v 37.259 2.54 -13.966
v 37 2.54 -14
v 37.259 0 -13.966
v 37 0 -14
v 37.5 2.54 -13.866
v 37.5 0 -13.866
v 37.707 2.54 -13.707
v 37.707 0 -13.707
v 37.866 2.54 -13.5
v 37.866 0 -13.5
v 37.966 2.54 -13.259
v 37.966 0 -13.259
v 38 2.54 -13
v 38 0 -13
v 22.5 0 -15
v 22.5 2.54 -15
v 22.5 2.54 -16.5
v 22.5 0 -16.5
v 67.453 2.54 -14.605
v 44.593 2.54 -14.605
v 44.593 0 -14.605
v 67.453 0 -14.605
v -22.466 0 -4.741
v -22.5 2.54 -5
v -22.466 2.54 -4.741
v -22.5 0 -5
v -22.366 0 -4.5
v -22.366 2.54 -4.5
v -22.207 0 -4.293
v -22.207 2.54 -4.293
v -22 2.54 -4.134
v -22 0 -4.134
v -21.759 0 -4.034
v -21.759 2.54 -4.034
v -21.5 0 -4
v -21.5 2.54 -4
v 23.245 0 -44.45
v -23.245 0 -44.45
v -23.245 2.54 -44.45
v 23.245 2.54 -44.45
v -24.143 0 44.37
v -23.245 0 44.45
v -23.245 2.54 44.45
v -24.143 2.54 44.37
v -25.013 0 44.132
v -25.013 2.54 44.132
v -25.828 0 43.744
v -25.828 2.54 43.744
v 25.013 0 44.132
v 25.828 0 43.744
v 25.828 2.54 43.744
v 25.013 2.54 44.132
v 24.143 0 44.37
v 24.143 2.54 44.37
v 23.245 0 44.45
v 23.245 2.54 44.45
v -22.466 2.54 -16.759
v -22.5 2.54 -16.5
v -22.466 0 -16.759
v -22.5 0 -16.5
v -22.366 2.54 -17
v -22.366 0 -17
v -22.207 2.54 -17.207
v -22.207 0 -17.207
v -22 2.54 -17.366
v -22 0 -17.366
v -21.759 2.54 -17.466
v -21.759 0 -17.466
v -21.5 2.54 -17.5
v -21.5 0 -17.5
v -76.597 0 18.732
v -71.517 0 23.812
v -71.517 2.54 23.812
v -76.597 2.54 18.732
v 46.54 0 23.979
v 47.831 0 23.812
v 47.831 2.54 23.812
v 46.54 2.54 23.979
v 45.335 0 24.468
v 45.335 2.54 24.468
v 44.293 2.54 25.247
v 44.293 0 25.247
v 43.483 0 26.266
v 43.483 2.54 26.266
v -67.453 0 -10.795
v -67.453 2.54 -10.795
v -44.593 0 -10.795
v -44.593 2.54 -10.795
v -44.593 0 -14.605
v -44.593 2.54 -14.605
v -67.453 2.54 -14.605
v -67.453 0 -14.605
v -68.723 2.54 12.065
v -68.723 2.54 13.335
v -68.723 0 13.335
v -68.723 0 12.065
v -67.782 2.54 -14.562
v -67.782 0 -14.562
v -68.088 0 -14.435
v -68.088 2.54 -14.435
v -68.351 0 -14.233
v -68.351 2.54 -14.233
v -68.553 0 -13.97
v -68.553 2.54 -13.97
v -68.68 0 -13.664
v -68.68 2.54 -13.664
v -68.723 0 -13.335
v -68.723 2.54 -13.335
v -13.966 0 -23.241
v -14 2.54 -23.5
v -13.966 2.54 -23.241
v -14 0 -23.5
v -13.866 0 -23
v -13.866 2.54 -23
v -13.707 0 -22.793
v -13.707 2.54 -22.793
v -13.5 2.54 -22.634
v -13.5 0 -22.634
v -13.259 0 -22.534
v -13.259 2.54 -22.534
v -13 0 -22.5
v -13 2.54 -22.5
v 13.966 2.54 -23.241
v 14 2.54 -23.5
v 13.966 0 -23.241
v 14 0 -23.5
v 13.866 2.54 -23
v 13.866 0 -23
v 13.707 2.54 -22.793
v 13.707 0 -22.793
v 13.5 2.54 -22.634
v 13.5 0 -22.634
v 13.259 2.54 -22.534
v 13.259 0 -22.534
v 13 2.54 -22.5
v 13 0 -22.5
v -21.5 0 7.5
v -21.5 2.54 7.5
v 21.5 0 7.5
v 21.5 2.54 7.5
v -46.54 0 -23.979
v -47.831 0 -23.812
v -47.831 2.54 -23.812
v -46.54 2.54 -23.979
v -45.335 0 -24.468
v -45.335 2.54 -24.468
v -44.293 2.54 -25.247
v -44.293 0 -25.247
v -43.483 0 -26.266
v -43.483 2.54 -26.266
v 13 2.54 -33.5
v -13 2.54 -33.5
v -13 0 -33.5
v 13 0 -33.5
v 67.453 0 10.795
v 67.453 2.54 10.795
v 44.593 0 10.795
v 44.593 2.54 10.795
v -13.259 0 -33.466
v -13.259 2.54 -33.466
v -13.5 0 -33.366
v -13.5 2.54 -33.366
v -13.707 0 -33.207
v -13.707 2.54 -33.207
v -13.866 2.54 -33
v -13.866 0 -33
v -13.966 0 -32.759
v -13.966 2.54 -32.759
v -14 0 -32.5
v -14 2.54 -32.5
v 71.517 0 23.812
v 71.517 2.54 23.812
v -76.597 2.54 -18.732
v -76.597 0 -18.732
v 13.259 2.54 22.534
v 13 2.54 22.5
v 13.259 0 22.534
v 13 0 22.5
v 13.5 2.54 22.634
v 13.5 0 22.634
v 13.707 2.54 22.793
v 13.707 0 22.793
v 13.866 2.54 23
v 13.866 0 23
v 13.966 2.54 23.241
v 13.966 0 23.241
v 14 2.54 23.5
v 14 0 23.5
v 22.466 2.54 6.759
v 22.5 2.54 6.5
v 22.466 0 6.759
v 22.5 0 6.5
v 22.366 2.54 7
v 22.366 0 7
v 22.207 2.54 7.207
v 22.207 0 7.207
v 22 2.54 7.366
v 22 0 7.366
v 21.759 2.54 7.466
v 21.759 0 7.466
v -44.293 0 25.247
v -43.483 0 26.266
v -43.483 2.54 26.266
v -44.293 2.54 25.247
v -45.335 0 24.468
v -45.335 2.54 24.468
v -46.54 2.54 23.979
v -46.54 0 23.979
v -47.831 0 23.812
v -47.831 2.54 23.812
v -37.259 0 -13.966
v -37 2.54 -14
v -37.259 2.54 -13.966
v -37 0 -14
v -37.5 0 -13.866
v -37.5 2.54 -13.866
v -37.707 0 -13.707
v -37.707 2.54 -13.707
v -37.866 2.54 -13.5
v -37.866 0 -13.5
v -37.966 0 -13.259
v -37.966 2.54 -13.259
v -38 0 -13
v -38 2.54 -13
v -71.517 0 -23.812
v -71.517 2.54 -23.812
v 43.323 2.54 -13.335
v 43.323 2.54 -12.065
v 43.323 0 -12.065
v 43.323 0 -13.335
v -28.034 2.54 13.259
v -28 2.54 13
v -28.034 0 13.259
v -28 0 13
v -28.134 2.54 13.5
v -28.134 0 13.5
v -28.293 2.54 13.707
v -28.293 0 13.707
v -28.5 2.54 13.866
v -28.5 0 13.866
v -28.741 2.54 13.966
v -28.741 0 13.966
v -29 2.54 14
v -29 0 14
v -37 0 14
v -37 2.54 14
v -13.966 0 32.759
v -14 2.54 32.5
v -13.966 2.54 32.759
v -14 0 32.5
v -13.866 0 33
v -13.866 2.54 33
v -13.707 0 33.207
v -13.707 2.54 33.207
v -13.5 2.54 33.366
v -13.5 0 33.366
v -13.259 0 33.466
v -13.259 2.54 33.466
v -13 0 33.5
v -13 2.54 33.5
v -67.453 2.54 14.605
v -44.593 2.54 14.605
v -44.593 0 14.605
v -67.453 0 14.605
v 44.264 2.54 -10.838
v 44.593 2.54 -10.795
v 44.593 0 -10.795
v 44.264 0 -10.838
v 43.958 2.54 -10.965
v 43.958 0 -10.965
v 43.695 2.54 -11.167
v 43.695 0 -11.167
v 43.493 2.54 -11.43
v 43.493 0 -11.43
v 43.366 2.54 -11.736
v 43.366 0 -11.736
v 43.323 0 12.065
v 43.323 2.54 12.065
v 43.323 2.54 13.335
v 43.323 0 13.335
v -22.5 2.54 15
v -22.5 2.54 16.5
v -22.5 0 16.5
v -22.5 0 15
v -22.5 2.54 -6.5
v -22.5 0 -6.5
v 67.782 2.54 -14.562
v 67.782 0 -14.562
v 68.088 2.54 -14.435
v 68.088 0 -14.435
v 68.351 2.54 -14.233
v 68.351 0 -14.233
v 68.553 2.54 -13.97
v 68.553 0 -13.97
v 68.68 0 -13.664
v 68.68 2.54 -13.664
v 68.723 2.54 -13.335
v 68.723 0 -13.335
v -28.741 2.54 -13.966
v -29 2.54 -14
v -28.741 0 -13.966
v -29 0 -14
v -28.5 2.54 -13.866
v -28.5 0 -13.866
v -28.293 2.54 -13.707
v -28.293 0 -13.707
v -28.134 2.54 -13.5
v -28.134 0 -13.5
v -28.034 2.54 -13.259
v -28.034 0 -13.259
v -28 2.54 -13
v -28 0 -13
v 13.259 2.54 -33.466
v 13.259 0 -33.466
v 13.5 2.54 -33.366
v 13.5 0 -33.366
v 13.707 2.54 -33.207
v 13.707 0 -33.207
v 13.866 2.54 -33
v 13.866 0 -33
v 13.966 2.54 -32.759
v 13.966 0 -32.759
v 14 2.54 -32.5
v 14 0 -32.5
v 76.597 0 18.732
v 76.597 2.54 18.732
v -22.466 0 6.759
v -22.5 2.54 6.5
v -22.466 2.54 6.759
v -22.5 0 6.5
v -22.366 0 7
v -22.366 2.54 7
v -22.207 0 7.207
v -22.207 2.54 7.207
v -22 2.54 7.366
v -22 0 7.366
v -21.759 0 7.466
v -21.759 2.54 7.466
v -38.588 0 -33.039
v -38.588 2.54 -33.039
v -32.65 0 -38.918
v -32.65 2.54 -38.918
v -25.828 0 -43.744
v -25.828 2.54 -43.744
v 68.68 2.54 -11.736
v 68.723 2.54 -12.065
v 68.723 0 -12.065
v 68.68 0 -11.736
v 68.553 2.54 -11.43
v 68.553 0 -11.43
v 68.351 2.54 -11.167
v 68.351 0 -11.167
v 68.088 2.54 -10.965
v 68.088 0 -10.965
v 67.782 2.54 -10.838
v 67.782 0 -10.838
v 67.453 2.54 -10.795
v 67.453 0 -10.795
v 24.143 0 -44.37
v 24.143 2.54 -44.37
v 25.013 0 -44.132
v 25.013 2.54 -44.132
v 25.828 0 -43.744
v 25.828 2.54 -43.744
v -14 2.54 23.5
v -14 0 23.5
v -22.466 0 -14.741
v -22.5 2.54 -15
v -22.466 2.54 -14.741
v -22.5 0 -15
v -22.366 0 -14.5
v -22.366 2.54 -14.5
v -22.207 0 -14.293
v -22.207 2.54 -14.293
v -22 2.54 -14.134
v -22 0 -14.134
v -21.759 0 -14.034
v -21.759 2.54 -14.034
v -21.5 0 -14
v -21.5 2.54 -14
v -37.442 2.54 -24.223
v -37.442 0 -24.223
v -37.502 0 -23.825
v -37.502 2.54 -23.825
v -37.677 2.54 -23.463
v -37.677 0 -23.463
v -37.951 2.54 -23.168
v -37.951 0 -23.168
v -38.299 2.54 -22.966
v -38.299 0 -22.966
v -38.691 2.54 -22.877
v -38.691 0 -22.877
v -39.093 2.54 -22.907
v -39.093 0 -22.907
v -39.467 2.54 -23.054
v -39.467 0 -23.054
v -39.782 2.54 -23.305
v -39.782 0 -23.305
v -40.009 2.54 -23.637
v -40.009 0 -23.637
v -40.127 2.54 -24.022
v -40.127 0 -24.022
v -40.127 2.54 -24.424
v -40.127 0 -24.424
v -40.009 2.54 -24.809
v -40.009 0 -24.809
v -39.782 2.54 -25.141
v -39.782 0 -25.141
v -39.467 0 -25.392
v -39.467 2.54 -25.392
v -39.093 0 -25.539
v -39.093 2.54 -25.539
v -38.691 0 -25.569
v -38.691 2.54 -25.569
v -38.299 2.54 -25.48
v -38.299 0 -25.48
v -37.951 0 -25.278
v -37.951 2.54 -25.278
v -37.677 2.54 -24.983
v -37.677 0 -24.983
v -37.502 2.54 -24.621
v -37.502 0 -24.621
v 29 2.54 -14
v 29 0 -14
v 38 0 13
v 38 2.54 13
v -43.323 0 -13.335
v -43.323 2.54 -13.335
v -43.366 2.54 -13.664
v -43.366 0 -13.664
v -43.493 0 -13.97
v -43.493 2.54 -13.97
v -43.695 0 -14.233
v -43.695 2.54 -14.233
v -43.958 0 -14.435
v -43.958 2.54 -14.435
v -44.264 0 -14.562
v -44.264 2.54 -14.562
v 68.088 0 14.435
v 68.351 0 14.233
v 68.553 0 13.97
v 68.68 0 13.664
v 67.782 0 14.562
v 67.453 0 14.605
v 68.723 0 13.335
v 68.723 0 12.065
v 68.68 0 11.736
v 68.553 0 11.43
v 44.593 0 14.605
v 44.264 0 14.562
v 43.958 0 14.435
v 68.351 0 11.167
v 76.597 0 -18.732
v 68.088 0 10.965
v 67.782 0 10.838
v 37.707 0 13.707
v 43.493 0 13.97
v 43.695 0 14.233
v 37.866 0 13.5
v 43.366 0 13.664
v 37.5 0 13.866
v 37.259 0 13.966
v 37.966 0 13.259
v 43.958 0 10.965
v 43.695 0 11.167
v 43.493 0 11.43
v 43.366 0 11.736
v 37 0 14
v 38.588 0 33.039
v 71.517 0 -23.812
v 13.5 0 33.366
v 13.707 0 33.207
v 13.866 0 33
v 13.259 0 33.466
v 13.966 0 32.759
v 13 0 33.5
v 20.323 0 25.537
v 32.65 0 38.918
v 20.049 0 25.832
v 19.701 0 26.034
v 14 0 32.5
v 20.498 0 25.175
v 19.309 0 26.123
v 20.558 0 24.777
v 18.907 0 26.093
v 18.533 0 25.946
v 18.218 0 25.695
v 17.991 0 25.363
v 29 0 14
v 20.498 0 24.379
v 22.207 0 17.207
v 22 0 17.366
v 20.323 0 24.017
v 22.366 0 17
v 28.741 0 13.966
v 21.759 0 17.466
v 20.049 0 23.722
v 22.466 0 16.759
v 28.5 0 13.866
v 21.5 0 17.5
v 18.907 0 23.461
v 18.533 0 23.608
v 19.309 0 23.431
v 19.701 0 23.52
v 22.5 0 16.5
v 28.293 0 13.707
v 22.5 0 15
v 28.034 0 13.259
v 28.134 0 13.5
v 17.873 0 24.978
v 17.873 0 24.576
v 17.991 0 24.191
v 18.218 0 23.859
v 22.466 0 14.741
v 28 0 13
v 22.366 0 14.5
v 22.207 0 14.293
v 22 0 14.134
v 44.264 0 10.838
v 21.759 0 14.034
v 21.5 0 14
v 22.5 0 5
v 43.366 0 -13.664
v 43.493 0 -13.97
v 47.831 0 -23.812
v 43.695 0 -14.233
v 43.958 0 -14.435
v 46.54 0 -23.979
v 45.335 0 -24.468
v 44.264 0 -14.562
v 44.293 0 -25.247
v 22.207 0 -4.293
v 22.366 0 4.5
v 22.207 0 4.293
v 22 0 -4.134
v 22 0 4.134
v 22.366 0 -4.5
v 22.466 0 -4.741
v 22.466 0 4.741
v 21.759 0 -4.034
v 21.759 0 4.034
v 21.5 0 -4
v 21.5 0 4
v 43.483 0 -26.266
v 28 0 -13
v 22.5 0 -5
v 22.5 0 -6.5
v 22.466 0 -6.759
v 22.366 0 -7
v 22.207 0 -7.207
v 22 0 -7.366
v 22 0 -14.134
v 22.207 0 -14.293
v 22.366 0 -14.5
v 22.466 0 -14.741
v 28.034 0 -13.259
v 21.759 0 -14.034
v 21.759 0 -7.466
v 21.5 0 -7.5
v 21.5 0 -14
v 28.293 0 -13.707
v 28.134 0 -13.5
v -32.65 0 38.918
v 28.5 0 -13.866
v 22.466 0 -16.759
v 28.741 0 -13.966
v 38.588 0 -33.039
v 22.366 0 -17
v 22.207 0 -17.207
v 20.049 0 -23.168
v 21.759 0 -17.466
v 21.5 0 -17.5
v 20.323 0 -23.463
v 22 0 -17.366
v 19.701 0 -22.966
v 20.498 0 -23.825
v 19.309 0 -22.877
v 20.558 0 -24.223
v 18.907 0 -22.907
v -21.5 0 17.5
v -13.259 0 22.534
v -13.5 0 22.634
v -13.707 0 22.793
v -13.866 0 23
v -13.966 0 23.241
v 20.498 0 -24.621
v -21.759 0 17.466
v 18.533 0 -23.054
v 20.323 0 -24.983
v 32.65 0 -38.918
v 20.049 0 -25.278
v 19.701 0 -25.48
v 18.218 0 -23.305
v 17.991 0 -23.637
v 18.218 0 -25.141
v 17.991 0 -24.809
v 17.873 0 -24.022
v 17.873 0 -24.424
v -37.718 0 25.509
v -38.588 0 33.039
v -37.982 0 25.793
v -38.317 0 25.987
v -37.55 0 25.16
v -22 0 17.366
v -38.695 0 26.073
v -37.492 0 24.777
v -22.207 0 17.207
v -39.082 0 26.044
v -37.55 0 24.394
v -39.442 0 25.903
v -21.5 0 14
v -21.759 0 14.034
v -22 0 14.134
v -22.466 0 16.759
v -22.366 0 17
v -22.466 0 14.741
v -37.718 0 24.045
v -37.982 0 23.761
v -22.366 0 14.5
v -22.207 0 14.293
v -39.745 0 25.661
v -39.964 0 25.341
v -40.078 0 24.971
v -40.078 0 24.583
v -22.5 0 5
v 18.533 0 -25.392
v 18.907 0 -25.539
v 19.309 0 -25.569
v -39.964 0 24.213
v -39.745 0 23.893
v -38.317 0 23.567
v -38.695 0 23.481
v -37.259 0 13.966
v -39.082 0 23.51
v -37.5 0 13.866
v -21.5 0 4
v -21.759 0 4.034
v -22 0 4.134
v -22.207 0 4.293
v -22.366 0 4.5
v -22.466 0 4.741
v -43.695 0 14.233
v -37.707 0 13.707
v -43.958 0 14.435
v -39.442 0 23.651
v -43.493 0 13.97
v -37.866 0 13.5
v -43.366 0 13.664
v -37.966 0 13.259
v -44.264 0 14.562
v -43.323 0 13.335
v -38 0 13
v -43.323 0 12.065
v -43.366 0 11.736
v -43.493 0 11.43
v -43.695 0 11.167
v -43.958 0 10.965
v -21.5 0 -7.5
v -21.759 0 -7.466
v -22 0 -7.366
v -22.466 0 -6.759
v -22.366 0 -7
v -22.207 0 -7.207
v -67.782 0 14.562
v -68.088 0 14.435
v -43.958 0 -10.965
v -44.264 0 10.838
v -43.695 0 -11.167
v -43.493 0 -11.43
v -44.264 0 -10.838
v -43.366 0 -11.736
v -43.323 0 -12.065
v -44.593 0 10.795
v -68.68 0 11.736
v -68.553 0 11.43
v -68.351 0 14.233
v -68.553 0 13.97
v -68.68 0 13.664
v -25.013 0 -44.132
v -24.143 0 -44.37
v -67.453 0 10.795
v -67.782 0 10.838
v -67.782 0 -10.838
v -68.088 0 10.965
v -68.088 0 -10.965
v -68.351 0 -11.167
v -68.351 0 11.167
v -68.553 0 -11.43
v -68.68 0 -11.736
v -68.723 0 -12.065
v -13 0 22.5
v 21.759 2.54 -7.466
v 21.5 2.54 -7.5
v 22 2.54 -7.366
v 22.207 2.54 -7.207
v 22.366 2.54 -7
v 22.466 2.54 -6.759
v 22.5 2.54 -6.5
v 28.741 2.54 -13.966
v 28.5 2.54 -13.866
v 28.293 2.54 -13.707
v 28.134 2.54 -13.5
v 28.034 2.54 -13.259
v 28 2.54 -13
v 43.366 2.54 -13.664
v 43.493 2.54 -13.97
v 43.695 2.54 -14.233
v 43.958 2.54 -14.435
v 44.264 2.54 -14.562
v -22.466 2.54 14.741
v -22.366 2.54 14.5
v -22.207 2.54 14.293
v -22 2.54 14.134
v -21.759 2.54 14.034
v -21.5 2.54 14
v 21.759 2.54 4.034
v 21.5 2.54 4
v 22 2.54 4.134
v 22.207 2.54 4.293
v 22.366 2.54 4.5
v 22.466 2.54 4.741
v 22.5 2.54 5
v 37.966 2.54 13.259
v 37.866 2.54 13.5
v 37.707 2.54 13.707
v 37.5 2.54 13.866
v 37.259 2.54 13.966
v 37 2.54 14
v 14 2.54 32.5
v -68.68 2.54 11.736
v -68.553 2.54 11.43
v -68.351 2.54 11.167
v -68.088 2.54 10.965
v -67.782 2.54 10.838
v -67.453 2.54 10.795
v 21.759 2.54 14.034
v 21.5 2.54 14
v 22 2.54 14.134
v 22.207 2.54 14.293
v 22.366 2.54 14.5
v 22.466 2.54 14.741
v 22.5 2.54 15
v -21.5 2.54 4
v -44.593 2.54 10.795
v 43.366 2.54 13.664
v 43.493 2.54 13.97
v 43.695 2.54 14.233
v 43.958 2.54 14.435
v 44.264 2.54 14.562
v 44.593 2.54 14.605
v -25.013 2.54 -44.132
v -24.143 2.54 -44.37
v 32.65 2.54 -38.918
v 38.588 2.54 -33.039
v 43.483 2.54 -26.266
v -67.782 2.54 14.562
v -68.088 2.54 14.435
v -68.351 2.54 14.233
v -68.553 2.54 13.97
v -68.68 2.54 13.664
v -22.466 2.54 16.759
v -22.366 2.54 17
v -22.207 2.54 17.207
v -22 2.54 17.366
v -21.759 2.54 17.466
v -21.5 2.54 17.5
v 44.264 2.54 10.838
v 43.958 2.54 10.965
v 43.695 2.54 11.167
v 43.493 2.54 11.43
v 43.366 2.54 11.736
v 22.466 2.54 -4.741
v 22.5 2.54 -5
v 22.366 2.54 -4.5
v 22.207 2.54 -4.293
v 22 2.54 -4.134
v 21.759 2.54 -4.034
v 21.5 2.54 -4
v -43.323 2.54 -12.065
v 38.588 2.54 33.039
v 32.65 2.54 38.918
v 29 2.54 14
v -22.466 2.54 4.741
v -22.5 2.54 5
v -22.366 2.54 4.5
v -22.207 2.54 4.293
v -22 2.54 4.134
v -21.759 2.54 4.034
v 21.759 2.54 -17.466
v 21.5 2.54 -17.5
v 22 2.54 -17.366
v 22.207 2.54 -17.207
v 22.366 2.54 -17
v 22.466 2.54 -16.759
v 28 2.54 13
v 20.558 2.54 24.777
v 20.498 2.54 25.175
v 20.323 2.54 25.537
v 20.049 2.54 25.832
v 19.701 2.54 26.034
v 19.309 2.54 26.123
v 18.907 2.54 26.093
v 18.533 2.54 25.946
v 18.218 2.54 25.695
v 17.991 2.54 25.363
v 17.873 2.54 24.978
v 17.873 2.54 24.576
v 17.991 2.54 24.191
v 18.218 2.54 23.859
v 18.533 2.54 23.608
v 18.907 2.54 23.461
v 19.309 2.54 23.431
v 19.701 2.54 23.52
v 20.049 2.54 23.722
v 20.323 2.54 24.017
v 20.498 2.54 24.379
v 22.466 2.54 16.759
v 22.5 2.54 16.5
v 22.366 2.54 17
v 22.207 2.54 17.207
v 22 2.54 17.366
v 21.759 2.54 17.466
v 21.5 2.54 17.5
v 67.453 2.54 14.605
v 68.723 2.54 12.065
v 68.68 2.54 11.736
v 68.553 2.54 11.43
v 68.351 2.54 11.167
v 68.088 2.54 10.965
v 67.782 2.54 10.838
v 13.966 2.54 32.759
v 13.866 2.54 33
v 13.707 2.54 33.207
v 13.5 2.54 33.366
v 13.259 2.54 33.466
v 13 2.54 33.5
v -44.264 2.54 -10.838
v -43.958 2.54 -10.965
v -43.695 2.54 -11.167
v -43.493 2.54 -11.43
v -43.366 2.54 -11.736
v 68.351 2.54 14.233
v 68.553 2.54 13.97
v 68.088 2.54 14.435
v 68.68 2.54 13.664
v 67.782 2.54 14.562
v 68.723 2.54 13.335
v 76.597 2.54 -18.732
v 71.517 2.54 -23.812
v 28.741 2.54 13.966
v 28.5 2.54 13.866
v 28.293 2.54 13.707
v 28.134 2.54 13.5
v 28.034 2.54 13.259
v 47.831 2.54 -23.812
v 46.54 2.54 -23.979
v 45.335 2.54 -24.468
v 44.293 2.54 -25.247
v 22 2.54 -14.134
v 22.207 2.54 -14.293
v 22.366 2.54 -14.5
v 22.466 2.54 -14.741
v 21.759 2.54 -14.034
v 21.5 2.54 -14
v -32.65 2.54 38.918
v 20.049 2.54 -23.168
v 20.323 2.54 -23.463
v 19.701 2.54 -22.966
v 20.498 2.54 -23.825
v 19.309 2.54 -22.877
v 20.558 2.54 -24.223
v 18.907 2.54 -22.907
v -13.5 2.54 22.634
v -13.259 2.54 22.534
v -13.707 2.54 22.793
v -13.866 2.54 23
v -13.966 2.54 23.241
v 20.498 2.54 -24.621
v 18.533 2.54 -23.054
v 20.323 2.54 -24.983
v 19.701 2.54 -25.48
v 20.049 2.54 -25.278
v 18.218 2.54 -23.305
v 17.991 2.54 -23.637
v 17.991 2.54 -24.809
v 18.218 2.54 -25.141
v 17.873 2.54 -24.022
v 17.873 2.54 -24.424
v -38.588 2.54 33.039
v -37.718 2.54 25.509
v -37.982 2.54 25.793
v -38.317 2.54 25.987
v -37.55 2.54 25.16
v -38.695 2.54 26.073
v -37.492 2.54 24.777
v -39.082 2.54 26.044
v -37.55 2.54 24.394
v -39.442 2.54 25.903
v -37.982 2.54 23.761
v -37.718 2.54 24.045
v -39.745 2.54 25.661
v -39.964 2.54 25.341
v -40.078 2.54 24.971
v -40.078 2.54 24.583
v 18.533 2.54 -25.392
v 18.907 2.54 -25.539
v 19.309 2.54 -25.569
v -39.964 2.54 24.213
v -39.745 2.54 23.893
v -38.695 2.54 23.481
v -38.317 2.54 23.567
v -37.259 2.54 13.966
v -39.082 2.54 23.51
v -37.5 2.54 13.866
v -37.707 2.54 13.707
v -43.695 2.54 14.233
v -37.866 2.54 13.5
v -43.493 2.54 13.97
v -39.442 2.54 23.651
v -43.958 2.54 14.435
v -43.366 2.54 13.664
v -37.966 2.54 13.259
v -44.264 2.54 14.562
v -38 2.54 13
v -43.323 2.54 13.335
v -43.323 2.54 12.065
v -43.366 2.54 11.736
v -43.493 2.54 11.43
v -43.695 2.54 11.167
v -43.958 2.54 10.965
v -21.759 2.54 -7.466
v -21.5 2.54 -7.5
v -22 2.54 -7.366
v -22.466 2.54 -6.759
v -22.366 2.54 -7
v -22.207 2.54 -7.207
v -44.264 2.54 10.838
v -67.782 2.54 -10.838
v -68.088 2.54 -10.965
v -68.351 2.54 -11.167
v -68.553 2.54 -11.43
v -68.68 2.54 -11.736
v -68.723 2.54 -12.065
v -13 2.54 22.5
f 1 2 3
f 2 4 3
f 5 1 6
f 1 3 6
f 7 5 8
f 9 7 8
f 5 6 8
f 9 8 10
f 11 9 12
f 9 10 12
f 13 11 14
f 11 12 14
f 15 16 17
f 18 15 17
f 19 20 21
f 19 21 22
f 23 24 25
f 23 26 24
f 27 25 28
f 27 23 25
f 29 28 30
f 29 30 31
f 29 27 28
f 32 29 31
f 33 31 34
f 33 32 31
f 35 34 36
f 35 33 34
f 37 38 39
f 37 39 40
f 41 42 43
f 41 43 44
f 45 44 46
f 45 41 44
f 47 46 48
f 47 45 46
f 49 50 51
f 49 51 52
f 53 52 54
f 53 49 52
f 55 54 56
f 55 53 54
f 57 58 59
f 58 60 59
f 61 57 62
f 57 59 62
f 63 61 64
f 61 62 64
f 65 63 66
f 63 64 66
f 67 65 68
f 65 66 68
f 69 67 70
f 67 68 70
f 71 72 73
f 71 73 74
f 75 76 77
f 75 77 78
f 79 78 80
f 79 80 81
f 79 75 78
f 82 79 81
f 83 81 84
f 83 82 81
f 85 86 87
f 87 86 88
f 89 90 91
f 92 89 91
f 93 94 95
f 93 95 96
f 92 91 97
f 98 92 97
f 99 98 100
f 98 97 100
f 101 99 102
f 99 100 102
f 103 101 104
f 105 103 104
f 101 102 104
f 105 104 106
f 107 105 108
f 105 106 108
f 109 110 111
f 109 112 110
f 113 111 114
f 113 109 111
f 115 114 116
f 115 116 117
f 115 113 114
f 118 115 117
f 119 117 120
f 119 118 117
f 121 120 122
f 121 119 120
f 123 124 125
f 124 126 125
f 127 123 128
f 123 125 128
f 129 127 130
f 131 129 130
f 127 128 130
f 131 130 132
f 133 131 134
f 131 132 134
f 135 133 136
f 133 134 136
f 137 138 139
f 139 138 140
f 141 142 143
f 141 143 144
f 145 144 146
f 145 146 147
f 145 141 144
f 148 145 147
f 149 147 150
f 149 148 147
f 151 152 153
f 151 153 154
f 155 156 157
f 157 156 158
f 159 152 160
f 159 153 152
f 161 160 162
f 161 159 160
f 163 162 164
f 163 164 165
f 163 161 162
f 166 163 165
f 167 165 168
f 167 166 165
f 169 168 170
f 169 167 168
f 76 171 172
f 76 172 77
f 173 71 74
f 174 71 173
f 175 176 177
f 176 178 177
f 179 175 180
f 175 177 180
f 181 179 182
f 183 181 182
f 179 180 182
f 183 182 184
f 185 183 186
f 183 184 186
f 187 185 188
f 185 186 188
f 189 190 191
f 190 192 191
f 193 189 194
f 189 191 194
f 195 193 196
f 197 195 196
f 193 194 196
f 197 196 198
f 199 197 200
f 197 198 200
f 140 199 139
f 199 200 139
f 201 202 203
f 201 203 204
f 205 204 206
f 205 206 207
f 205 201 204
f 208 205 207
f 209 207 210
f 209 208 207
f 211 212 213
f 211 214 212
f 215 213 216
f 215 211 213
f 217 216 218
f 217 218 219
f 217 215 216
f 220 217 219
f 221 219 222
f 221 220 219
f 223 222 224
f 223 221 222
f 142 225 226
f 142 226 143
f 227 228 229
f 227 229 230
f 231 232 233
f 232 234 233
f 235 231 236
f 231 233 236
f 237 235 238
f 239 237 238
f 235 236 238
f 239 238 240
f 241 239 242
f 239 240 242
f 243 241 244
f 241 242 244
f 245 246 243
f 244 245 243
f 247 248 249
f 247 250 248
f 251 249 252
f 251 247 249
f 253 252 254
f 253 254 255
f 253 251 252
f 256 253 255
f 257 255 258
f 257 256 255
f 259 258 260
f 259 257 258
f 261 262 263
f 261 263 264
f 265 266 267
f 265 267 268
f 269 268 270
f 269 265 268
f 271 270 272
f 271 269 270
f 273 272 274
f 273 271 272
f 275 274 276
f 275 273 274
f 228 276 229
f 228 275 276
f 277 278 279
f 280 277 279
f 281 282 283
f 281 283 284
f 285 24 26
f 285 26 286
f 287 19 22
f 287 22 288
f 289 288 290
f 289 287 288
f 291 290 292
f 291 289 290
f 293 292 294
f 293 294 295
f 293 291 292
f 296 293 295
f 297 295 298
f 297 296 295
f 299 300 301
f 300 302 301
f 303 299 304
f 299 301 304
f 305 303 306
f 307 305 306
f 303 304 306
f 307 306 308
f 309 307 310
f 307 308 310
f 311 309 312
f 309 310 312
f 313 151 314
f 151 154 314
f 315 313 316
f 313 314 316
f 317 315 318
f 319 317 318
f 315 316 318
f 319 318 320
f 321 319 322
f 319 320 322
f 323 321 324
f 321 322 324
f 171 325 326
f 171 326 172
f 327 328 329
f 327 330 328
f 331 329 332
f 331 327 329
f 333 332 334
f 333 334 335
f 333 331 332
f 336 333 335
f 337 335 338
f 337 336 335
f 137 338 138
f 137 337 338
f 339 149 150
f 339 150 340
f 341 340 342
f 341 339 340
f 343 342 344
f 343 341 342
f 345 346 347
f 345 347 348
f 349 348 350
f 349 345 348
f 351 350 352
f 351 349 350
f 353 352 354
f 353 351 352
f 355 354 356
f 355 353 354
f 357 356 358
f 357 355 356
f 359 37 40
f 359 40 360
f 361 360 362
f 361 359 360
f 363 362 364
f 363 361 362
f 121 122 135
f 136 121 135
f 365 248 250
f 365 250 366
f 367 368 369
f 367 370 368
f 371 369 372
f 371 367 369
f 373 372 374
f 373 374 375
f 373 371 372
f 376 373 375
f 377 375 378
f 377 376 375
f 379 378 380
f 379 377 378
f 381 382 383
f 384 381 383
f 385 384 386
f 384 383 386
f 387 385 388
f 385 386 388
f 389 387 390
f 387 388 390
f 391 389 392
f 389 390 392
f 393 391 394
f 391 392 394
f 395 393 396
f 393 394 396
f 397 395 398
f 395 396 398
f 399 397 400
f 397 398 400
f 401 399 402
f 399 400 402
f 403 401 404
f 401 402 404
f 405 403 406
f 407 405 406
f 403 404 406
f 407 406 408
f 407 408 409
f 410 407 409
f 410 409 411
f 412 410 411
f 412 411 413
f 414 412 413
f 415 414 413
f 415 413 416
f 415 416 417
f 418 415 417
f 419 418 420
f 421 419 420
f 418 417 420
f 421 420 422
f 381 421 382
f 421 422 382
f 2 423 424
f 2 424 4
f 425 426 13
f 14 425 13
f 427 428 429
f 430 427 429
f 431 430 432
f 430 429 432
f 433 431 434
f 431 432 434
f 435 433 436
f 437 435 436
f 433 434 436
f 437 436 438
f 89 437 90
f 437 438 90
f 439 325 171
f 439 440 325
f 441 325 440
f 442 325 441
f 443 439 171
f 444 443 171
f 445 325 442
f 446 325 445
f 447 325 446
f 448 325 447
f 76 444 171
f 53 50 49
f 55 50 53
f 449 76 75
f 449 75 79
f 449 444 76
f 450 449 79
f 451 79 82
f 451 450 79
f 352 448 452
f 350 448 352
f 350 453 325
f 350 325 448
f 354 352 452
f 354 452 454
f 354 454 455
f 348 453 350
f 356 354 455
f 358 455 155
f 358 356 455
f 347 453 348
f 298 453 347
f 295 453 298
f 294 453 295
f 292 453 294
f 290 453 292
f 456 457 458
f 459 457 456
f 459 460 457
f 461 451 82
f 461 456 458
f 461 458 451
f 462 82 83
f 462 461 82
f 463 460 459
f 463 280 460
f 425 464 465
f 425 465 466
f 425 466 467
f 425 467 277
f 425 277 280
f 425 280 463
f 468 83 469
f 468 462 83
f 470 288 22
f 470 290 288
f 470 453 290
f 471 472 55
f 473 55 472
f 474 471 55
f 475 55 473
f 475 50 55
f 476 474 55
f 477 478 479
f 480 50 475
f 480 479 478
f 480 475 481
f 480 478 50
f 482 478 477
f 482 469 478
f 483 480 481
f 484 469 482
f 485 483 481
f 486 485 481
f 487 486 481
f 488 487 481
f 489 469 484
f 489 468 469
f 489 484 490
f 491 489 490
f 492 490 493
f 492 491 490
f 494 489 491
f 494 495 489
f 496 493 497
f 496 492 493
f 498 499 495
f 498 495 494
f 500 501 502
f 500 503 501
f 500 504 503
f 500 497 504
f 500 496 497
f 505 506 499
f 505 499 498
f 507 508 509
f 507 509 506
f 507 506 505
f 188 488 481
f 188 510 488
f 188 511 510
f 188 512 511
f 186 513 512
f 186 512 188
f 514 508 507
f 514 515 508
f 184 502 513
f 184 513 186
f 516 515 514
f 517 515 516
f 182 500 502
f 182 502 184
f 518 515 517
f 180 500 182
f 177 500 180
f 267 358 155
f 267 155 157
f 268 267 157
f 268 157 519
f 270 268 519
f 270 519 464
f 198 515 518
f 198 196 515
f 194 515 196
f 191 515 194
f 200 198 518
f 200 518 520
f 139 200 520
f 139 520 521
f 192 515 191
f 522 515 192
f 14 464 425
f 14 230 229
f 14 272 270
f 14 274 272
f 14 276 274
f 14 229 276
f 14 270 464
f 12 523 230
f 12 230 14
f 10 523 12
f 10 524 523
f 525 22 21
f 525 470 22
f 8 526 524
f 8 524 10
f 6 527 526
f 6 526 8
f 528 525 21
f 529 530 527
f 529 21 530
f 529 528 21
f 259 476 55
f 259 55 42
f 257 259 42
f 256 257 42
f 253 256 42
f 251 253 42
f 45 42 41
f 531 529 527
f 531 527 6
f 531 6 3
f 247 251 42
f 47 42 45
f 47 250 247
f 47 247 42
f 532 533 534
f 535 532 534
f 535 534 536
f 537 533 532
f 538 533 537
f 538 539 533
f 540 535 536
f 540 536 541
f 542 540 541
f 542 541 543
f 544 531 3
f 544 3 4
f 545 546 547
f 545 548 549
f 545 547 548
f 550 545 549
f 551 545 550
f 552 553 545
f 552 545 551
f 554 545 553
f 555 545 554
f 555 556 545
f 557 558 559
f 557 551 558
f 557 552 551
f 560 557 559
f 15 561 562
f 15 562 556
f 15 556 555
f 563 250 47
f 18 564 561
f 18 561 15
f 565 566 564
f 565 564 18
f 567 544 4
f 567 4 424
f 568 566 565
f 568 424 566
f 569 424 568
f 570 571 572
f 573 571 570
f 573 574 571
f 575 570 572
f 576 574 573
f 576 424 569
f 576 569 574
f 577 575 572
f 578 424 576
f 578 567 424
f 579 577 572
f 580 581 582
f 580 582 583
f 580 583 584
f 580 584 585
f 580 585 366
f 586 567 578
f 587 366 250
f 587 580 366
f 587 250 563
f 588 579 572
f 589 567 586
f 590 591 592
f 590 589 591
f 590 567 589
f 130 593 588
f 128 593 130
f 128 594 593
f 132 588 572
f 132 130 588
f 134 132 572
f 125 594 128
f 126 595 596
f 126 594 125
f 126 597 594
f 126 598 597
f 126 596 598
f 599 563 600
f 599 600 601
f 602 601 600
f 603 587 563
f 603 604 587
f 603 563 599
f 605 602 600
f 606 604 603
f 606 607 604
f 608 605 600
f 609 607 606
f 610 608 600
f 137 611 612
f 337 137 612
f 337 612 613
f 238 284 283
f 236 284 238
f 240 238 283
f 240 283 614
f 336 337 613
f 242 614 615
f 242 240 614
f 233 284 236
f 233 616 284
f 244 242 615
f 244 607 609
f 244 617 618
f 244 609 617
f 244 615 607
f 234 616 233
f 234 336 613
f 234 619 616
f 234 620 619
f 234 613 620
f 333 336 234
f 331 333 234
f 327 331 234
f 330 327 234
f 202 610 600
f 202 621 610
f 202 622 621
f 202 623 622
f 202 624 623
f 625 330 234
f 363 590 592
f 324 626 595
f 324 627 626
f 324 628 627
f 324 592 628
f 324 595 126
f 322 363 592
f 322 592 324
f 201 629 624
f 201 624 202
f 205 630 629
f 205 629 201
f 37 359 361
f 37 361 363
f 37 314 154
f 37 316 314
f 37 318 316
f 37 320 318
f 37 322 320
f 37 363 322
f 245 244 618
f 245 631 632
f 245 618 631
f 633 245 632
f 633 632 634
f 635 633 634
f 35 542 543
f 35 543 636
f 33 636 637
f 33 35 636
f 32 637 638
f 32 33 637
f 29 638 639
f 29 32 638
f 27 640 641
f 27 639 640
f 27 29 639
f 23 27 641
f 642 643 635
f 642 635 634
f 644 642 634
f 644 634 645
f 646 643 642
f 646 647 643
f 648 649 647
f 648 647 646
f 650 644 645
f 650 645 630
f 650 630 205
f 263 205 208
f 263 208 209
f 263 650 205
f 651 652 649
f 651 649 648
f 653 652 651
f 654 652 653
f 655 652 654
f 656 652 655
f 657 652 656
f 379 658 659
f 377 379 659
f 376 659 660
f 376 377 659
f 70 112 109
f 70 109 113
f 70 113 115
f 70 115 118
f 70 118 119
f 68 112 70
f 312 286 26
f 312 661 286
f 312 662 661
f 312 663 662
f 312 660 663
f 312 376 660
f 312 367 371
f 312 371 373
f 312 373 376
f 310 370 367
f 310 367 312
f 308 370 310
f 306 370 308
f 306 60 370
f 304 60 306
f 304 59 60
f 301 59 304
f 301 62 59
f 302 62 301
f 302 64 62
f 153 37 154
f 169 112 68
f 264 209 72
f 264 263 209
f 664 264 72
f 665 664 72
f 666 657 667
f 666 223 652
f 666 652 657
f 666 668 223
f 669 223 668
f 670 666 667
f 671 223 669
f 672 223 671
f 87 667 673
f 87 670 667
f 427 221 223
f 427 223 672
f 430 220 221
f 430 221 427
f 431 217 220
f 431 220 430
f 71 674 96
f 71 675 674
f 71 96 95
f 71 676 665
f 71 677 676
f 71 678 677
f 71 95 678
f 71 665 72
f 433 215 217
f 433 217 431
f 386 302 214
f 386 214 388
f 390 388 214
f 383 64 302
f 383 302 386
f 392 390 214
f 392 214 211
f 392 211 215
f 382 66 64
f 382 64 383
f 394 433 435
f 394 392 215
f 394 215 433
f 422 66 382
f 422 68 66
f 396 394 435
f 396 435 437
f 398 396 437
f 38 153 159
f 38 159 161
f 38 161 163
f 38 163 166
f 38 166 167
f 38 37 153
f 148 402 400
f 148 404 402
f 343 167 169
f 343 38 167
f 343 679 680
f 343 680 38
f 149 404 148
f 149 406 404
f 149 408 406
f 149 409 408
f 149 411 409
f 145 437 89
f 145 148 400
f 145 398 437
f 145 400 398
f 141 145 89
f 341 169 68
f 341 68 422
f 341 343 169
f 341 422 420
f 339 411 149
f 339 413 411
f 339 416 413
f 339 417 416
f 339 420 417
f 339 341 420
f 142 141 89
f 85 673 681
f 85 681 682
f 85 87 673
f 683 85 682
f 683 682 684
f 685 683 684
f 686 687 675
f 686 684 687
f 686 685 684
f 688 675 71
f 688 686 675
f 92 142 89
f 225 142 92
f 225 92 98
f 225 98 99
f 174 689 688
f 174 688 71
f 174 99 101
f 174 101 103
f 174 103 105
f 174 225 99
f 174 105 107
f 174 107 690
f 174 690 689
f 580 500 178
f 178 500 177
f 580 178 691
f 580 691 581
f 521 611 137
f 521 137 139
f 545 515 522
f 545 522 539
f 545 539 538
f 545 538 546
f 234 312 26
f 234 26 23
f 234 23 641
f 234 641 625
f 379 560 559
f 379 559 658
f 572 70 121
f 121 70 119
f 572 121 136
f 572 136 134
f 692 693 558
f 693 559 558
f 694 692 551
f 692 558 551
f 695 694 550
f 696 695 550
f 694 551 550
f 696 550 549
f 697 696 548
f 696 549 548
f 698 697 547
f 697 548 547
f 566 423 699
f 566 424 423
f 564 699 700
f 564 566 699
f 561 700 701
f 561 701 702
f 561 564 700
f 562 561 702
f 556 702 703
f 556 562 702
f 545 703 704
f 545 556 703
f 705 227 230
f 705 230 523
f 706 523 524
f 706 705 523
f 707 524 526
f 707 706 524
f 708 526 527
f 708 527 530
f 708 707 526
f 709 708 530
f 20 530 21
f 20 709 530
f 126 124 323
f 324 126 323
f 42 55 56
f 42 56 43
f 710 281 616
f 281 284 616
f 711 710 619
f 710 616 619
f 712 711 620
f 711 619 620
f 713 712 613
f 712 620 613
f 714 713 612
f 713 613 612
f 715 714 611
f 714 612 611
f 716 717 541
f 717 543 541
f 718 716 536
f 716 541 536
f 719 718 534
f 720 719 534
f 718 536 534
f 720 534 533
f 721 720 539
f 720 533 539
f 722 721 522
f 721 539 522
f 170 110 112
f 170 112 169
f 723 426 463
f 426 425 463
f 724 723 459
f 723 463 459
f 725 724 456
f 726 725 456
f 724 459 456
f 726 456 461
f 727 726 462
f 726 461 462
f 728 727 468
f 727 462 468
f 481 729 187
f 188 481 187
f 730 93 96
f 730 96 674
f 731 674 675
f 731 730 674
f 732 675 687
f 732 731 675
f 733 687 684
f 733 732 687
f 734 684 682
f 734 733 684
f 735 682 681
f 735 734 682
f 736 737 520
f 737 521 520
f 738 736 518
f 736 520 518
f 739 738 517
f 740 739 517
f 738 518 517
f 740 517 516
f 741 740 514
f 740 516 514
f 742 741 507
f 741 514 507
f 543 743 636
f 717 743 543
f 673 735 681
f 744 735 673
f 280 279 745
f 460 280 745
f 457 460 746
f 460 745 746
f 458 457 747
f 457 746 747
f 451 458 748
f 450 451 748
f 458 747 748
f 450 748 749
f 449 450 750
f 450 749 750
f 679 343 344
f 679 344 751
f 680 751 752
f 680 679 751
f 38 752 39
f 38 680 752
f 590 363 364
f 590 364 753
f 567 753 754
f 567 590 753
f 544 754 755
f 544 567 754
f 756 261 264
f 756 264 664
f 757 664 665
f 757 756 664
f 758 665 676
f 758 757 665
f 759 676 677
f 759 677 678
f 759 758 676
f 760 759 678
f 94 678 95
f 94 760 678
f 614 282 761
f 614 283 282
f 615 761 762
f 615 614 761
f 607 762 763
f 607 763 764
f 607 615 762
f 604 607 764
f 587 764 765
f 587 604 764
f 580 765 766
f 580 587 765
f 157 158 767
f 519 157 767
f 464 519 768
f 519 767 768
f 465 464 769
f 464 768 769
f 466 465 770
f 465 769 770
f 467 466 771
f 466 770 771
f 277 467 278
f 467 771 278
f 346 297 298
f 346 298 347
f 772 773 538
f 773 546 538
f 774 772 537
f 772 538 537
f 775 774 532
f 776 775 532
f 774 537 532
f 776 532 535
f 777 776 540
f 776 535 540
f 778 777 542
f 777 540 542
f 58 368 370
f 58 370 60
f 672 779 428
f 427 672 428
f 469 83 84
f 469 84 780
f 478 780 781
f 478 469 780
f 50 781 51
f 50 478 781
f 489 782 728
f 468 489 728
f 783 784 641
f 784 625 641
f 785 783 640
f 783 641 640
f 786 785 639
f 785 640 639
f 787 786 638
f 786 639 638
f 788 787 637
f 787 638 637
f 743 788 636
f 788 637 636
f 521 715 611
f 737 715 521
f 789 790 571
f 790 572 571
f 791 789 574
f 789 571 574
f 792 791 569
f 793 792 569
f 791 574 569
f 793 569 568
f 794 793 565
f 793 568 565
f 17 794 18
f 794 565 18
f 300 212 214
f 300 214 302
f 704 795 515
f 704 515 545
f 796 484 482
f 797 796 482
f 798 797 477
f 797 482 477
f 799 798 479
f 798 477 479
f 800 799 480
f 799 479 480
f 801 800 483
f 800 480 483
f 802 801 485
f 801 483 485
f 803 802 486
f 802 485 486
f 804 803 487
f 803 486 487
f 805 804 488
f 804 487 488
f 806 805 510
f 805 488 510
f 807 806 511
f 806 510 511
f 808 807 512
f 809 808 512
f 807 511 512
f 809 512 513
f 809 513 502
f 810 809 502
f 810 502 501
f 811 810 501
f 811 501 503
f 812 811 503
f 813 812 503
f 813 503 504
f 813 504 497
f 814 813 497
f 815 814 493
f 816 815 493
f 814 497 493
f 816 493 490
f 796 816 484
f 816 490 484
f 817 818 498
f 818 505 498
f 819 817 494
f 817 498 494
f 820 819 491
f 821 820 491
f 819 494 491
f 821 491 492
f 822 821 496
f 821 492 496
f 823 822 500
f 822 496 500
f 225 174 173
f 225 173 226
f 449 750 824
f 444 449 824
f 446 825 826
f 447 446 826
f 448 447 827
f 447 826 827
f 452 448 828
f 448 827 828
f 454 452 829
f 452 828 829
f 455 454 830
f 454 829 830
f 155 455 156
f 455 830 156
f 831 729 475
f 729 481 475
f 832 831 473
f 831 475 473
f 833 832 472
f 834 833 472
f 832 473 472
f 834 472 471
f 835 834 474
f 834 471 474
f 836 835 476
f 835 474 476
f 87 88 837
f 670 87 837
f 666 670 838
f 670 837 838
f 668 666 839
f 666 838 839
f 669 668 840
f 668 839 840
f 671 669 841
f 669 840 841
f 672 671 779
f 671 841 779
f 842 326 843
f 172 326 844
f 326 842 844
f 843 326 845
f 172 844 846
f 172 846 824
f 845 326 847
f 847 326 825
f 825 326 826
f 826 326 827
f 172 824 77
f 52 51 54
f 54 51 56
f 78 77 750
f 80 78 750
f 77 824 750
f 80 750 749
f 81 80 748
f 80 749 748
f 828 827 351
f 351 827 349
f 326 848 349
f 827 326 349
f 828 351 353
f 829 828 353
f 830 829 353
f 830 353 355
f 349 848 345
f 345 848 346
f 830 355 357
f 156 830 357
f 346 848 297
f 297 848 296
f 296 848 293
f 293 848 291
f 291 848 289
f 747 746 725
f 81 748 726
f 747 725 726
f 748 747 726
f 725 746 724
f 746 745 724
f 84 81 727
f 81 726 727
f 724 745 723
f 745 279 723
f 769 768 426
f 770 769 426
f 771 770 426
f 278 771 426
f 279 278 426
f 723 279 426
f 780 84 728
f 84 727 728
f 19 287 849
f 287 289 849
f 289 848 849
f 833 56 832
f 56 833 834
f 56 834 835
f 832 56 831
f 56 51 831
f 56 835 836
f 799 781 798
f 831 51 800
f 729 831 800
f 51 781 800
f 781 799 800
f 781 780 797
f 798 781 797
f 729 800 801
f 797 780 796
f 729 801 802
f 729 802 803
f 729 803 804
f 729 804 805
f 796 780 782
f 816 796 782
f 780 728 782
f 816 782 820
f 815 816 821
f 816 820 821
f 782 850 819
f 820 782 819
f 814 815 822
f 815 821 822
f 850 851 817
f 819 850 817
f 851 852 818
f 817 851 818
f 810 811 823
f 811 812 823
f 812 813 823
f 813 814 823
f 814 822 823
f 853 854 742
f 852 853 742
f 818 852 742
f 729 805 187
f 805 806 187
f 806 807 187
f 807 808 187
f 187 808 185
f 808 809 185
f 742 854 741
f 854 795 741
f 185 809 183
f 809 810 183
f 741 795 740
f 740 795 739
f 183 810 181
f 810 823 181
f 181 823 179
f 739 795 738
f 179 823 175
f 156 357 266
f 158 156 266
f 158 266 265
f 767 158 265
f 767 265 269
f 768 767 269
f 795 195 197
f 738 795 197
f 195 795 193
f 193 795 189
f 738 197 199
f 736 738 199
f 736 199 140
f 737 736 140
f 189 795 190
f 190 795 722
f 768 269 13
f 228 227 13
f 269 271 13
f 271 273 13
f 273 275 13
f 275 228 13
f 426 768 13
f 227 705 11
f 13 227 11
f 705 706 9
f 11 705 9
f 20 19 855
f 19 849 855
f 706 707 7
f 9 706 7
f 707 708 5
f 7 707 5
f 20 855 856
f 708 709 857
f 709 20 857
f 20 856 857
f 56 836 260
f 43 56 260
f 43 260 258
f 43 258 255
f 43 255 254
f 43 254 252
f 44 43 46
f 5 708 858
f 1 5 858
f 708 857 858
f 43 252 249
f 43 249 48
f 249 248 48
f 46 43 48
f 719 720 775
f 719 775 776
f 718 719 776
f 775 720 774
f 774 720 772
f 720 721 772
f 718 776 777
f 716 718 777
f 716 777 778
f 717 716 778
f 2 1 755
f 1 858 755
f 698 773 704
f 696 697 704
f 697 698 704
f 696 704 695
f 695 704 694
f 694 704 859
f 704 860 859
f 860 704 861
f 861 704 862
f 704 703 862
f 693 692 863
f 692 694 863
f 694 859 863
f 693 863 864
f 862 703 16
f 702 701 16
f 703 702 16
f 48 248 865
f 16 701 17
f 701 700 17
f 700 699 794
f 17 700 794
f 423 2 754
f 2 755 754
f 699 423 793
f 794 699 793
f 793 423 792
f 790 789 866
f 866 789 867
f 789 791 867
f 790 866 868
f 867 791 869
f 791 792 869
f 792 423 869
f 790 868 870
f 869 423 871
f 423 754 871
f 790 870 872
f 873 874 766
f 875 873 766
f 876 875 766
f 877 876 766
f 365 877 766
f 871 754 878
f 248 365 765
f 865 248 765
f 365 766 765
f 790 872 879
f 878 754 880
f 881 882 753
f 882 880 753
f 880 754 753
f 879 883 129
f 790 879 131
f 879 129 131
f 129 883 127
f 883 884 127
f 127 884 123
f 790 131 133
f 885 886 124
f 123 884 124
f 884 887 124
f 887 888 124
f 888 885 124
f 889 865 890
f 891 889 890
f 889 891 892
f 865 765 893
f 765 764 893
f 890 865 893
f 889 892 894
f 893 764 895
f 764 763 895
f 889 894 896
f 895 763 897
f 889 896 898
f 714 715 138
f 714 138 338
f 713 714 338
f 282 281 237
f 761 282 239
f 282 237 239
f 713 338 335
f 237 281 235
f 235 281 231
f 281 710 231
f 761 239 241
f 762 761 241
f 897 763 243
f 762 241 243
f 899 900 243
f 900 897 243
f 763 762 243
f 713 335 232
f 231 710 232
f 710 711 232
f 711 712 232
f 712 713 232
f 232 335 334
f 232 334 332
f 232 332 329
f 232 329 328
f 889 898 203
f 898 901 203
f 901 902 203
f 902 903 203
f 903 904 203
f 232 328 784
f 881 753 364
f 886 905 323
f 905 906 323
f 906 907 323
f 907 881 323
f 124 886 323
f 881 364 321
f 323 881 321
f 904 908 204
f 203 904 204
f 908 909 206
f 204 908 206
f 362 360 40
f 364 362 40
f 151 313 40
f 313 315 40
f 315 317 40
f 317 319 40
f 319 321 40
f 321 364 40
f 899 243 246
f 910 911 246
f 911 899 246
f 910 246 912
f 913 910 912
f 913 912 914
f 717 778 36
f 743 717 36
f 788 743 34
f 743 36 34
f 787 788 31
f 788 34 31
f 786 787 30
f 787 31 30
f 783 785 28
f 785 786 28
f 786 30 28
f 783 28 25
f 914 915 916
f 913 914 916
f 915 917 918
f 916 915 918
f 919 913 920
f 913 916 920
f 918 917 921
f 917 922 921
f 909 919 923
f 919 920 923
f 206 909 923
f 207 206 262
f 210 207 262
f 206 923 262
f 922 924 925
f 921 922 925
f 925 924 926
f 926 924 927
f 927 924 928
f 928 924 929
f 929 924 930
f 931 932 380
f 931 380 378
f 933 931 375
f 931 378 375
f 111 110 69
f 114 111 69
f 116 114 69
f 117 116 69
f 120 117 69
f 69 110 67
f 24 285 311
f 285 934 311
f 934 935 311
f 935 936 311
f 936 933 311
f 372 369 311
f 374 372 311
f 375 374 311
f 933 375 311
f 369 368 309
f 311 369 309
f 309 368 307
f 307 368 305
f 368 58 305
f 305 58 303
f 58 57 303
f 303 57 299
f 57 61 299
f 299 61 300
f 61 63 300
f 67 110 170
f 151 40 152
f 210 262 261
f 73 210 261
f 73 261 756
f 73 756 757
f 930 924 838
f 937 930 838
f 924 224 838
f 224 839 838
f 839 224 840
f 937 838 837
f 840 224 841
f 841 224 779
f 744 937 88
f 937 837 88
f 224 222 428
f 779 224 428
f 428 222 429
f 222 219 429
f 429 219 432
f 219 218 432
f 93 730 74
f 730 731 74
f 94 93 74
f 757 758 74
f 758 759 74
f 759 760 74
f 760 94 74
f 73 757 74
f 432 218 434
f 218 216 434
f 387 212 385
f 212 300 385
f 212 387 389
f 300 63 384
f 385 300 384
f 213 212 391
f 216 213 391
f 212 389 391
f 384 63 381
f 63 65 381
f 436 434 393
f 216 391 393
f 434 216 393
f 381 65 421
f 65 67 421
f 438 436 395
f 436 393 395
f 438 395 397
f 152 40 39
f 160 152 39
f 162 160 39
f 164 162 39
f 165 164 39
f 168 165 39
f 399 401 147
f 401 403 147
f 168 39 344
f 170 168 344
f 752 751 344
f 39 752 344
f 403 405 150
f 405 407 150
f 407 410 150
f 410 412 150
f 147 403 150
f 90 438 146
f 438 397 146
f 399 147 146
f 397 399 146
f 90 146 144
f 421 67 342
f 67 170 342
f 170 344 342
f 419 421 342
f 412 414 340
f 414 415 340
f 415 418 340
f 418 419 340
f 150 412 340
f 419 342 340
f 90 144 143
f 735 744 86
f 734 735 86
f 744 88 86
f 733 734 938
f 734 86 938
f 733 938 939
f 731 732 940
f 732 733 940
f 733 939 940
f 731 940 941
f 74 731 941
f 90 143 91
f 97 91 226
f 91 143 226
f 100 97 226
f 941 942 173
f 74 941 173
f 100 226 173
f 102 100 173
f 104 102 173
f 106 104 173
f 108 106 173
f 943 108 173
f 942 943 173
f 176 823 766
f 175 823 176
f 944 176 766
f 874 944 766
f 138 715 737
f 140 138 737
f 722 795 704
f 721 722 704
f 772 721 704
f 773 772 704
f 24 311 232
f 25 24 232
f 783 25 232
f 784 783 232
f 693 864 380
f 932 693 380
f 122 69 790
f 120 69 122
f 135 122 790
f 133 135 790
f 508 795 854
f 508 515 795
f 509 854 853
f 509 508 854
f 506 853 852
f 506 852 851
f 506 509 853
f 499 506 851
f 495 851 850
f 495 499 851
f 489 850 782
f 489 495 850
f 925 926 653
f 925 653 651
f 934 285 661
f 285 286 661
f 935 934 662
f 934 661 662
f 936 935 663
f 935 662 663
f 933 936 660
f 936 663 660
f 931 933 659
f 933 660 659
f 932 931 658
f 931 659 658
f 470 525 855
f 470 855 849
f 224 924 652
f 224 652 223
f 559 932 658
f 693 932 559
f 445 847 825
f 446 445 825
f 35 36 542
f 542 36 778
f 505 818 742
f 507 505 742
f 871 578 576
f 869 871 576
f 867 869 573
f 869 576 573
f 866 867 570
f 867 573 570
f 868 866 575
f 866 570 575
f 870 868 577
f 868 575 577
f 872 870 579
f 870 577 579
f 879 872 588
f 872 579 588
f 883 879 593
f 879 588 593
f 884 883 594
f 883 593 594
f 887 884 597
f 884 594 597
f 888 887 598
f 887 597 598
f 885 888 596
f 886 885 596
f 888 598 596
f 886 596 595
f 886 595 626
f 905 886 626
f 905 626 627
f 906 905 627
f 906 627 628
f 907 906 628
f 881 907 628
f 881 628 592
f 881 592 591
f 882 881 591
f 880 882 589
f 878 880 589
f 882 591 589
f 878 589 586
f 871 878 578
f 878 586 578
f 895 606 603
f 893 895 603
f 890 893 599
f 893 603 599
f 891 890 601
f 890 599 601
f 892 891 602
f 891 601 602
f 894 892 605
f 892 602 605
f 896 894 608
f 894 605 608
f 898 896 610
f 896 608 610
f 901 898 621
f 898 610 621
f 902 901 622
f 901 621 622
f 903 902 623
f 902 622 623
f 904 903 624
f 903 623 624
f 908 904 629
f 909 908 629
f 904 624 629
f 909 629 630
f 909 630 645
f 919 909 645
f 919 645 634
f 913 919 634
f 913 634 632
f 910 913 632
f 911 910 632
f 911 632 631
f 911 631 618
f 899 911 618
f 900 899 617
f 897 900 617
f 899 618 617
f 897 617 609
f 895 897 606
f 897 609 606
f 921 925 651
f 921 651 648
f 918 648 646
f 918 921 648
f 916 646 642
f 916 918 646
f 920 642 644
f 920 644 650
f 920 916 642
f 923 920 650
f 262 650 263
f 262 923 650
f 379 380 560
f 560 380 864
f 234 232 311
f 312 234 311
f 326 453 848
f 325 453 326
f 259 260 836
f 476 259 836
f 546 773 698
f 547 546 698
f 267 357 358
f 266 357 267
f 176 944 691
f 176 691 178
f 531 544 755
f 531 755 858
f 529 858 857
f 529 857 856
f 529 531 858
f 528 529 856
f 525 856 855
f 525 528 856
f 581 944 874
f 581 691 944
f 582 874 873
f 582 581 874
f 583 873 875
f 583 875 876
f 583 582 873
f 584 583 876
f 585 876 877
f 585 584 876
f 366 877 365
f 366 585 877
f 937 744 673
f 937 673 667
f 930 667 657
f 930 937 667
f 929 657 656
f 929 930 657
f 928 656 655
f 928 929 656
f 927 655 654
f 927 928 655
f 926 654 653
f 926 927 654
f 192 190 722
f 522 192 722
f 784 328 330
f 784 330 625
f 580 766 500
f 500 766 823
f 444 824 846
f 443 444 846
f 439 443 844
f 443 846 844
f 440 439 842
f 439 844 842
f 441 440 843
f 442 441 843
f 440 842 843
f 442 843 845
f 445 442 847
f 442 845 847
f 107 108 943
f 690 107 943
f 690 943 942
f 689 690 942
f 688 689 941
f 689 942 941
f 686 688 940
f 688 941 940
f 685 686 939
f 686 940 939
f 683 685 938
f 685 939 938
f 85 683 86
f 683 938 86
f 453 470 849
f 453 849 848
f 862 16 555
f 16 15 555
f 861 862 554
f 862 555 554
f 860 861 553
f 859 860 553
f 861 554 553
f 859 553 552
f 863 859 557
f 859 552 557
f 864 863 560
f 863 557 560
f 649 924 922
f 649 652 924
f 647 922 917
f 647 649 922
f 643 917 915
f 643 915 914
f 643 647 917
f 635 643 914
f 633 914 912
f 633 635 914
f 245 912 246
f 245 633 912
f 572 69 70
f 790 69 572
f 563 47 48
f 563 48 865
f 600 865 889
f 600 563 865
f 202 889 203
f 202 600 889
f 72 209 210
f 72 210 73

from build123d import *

# Parameters (mm, degrees)
BOSS_EXTRUDE1_DEPTH = 2.54
SKETCH3_W           = 28
SKETCH3_H           = 11
SKETCH3_W_2         = 10
SKETCH3_H_2         = 28
CUT_EXTRUDE_1_DEPTH = 10
CUT_EXTRUDE2_DEPTH  = 2.54
SKETCH_1_W          = 45
SKETCH_1_H          = 3.5
CUT_EXTRUDE_2_DEPTH = 2.54
FILLET_1_R          = 1
SKETCH_2_R          = 1.35
SKETCH_2_R_2        = 1.3
CUT_EXTRUDE_5_DEPTH = 2.54


with BuildPart() as part:
    # Sketch1 → Boss-Extrude1 (new body)
    with BuildSketch(Plane(origin=(0, 0, 0), x_dir=(1, 0, 0), z_dir=(0, 1, 0))):
        with BuildLine():
            Line((-23.244816627, 44.45), (23.244816627, 44.45))
            ThreePointArc((23.244816627, 44.45), (24.583514169, 44.270437622), (25.827574029, 43.744444444))
            ThreePointArc((25.827574029, 43.744444444), (35.740062311, 36.101079569), (43.482663438, 26.265909091))
            ThreePointArc((43.482663438, 26.265909091), (45.334600658, 24.468164919), (47.830929781, 23.8125))
            Line((47.830929781, 23.8125), (71.516875, 23.8125))
            Line((71.516875, 23.8125), (76.596875, 18.7325))
            Line((76.596875, 18.7325), (76.596875, -18.7325))
            Line((76.596875, -18.7325), (71.516875, -23.8125))
            Line((71.516875, -23.8125), (47.830929781, -23.8125))
            ThreePointArc((47.830929781, -23.8125), (45.334600658, -24.468164919), (43.482663438, -26.265909091))
            ThreePointArc((43.482663438, -26.265909091), (35.740062311, -36.101079569), (25.827574029, -43.744444444))
            ThreePointArc((25.827574029, -43.744444444), (24.583514169, -44.270437622), (23.244816627, -44.45))
            Line((23.244816627, -44.45), (-23.244816627, -44.45))
            ThreePointArc((-23.244816627, -44.45), (-24.583514169, -44.270437622), (-25.827574029, -43.744444444))
            ThreePointArc((-25.827574029, -43.744444444), (-35.740062311, -36.101079569), (-43.482663438, -26.265909091))
            ThreePointArc((-43.482663438, -26.265909091), (-45.334600658, -24.468164919), (-47.830929781, -23.8125))
            Line((-47.830929781, -23.8125), (-71.516875, -23.8125))
            Line((-71.516875, -23.8125), (-76.596875, -18.7325))
            Line((-76.596875, -18.7325), (-76.596875, 18.7325))
            Line((-76.596875, 18.7325), (-71.516875, 23.8125))
            Line((-71.516875, 23.8125), (-47.830929781, 23.8125))
            ThreePointArc((-47.830929781, 23.8125), (-45.334600658, 24.468164919), (-43.482663438, 26.265909091))
            ThreePointArc((-43.482663438, 26.265909091), (-35.740062311, 36.101079569), (-25.827574029, 43.744444444))
            ThreePointArc((-25.827574029, 43.744444444), (-24.583514169, 44.270437622), (-23.244816627, 44.45))
        make_face()
    extrude(amount=BOSS_EXTRUDE1_DEPTH)

    # Sketch3 → 切除-拉伸1 (cut)
    with BuildSketch(Plane(origin=(0, 2.54, 0), x_dir=(1, 0, 0), z_dir=(0, 1, 0))):
        with Locations((0, 28)):
            Rectangle(SKETCH3_W, SKETCH3_H)
        with Locations((0, -28)):
            Rectangle(SKETCH3_W, SKETCH3_H)
        with Locations((-33, 0)):
            Rectangle(SKETCH3_W_2, SKETCH3_H_2)
        with Locations((33, 0)):
            Rectangle(SKETCH3_W_2, SKETCH3_H_2)
    extrude(amount=-CUT_EXTRUDE_1_DEPTH, mode=Mode.SUBTRACT)

    # Sketch4 → Cut-Extrude2 (cut)
    with BuildSketch(Plane(origin=(0, 2.54, 0), x_dir=(1, 0, 0), z_dir=(0, 1, 0))):
        with BuildLine():
            Line((44.592875, 14.605), (67.452875, 14.605))
            ThreePointArc((67.452875, 14.605), (68.350900612, 14.233025612), (68.722875, 13.335))
            Line((68.722875, 13.335), (68.722875, 12.065))
            ThreePointArc((68.722875, 12.065), (68.350900612, 11.166974388), (67.452875, 10.795))
            Line((67.452875, 10.795), (44.592875, 10.795))
            ThreePointArc((44.592875, 10.795), (43.694849388, 11.166974388), (43.322875, 12.065))
            Line((43.322875, 12.065), (43.322875, 13.335))
            ThreePointArc((43.322875, 13.335), (43.694849388, 14.233025612), (44.592875, 14.605))
        make_face()
        with BuildLine():
            Line((68.722875, -13.335), (68.722875, -12.065))
            ThreePointArc((68.722875, -12.065), (68.350900612, -11.166974388), (67.452875, -10.795))
            Line((67.452875, -10.795), (44.592875, -10.795))
            ThreePointArc((44.592875, -10.795), (43.694849388, -11.166974388), (43.322875, -12.065))
            Line((43.322875, -12.065), (43.322875, -13.335))
            ThreePointArc((43.322875, -13.335), (43.694849388, -14.233025612), (44.592875, -14.605))
            Line((44.592875, -14.605), (67.452875, -14.605))
            ThreePointArc((67.452875, -14.605), (68.350900612, -14.233025612), (68.722875, -13.335))
        make_face()
        with BuildLine():
            Line((-44.592875, -14.605), (-67.452875, -14.605))
            ThreePointArc((-67.452875, -14.605), (-68.350900612, -14.233025612), (-68.722875, -13.335))
            Line((-68.722875, -13.335), (-68.722875, -12.065))
            ThreePointArc((-68.722875, -12.065), (-68.350900612, -11.166974388), (-67.452875, -10.795))
            Line((-67.452875, -10.795), (-44.592875, -10.795))
            ThreePointArc((-44.592875, -10.795), (-43.694849388, -11.166974388), (-43.322875, -12.065))
            Line((-43.322875, -12.065), (-43.322875, -13.335))
            ThreePointArc((-43.322875, -13.335), (-43.694849388, -14.233025612), (-44.592875, -14.605))
        make_face()
        with BuildLine():
            Line((-68.722875, 13.335), (-68.722875, 12.065))
            ThreePointArc((-68.722875, 12.065), (-68.350900612, 11.166974388), (-67.452875, 10.795))
            Line((-67.452875, 10.795), (-44.592875, 10.795))
            ThreePointArc((-44.592875, 10.795), (-43.694849388, 11.166974388), (-43.322875, 12.065))
            Line((-43.322875, 12.065), (-43.322875, 13.335))
            ThreePointArc((-43.322875, 13.335), (-43.694849388, 14.233025612), (-44.592875, 14.605))
            Line((-44.592875, 14.605), (-67.452875, 14.605))
            ThreePointArc((-67.452875, 14.605), (-68.350900612, 14.233025612), (-68.722875, 13.335))
        make_face()
    extrude(amount=-CUT_EXTRUDE2_DEPTH, mode=Mode.SUBTRACT)

    # 草图1 → 切除-拉伸2 (cut)
    with BuildSketch(Plane(origin=(0, 2.54, 0), x_dir=(1, 0, 0), z_dir=(0, 1, 0))):
        with Locations((0, 5.75)):
            Rectangle(SKETCH_1_W, SKETCH_1_H)
        with Locations((0, 15.75)):
            Rectangle(SKETCH_1_W, SKETCH_1_H)
        with Locations((0, -5.75)):
            Rectangle(SKETCH_1_W, SKETCH_1_H)
        with Locations((0, -15.75)):
            Rectangle(SKETCH_1_W, SKETCH_1_H)
    extrude(amount=-CUT_EXTRUDE_2_DEPTH, mode=Mode.SUBTRACT)

    # 圆角1
    fillet_1_edges = [part.edges().sort_by_distance(p)[0] for p in [
        (-28, 1.27, -14),
        (-28, 1.27, 14),
        (-38, 1.27, 14),
        (-38, 1.27, -14),
        (38, 1.27, 14),
        (28, 1.27, 14),
        (28, 1.27, -14),
        (38, 1.27, -14),
        (22.5, 1.27, 17.5),
        (22.5, 1.27, 14),
        (-22.5, 1.27, 14),
        (-22.5, 1.27, 17.5),
        (22.5, 1.27, -17.5),
        (-22.5, 1.27, -17.5),
        (-22.5, 1.27, -14),
        (22.5, 1.27, -14),
        (22.5, 1.27, 7.5),
        (22.5, 1.27, 4),
        (-22.5, 1.27, 4),
        (-22.5, 1.27, 7.5),
        (-22.5, 1.27, -7.5),
        (-22.5, 1.27, -4),
        (22.5, 1.27, -4),
        (22.5, 1.27, -7.5),
        (14, 1.27, -33.5),
        (14, 1.27, -22.5),
        (-14, 1.27, -22.5),
        (-14, 1.27, -33.5),
        (14, 1.27, 33.5),
        (-14, 1.27, 33.5),
        (-14, 1.27, 22.5),
        (14, 1.27, 22.5),
    ]]
    fillet(fillet_1_edges, radius=FILLET_1_R)

    # 草图2 → 切除-拉伸5 (cut)
    with BuildSketch(Plane.XZ):
        with Locations((19.207738721, -24.223015039)):
            Circle(SKETCH_2_R)
        with Locations((19.207738721, 24.776984961)):
            Circle(SKETCH_2_R)
        with Locations((-38.792261279, -24.223015039)):
            Circle(SKETCH_2_R)
        with Locations((-38.792261279, 24.776984961)):
            Circle(SKETCH_2_R_2)
    extrude(amount=-CUT_EXTRUDE_5_DEPTH, mode=Mode.SUBTRACT)


solid = part.part
